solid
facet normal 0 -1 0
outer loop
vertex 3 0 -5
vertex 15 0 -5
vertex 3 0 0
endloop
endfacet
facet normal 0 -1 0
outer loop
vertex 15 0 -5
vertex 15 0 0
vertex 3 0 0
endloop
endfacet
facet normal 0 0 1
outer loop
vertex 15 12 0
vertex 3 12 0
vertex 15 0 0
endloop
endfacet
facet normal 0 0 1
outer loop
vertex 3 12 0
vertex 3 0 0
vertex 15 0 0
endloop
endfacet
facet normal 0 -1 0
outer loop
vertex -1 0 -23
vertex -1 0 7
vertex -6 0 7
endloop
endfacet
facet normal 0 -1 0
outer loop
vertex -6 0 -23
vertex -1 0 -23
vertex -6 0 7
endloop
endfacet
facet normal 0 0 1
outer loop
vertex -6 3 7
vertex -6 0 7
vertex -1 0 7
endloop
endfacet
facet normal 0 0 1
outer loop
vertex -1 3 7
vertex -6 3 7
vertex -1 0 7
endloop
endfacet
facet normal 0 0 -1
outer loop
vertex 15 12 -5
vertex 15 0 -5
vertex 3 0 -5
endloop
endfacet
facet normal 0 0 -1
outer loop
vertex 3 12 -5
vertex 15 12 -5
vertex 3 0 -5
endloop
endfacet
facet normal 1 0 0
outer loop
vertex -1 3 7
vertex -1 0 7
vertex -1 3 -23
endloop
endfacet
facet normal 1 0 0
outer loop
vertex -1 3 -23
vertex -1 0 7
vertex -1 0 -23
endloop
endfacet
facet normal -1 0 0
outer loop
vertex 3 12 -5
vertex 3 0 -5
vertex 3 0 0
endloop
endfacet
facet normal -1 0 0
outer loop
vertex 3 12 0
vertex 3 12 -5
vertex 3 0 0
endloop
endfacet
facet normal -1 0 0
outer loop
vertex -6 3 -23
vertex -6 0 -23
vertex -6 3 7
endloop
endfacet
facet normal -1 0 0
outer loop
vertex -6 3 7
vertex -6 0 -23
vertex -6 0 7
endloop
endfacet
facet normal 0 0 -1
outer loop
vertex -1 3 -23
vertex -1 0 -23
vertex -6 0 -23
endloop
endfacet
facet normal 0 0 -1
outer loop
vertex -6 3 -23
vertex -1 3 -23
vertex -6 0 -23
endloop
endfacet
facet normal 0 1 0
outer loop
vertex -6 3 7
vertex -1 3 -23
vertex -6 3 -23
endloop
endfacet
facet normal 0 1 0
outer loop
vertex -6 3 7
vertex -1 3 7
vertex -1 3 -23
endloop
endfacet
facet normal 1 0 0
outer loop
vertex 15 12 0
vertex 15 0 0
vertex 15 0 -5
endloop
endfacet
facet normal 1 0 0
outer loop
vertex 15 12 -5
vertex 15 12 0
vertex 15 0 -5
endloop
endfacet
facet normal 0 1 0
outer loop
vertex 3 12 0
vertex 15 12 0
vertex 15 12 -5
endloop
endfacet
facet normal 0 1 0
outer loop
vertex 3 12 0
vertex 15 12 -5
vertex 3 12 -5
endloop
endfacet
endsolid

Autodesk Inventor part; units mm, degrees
ref_plane "YZ Plane" through (0, 0, 0) normal (1, 0, 0) x (0, 1, 0)
ref_plane "XZ Plane" through (0, 0, 0) normal (0, 1, 0) x (-1, 0, 0)
ref_plane "XY Plane" through (0, 0, 0) normal (0, 0, 1) x (1, 0, 0)
sketch "Sketch1" plane through (0, 0, 0) normal (0, 1, 0) x (-1, 0, 0)
  line L0 (6, 7) -> (1, 7)
  line L1 (1, 7) -> (1, -23)
  line L2 (1, -23) -> (6, -23)
  line L3 (6, -23) -> (6, 7)
  line L4 (-3, 0) -> (-15, 0)
  line L5 (-15, 0) -> (-15, -5)
  line L6 (-15, -5) -> (-3, -5)
  line L7 (-3, -5) -> (-3, 0)
  point P0 (0, 0)
  dimension "d0" = 12
  dimension "d1" = 5
  dimension "d2" = 5
  dimension "d3" = 30
extrude "Extrusion1" add sketch "Sketch1" along normal blind 3 contours L3 L2 L1 L0
extrude "Extrusion2" add sketch "Sketch1" along normal blind 12 contours L7 L6 L5 L4
ref_plane "Work Plane1" through (1, 0, -5) normal (-1, 0, 0) x (0, 0, 1)
split body "Split1" result two bodies by plane through (1, 0, -5) normal (-1, 0, 0) first body at (-4.3333, 0.5, -13)
properties part number "Incastri 1"
